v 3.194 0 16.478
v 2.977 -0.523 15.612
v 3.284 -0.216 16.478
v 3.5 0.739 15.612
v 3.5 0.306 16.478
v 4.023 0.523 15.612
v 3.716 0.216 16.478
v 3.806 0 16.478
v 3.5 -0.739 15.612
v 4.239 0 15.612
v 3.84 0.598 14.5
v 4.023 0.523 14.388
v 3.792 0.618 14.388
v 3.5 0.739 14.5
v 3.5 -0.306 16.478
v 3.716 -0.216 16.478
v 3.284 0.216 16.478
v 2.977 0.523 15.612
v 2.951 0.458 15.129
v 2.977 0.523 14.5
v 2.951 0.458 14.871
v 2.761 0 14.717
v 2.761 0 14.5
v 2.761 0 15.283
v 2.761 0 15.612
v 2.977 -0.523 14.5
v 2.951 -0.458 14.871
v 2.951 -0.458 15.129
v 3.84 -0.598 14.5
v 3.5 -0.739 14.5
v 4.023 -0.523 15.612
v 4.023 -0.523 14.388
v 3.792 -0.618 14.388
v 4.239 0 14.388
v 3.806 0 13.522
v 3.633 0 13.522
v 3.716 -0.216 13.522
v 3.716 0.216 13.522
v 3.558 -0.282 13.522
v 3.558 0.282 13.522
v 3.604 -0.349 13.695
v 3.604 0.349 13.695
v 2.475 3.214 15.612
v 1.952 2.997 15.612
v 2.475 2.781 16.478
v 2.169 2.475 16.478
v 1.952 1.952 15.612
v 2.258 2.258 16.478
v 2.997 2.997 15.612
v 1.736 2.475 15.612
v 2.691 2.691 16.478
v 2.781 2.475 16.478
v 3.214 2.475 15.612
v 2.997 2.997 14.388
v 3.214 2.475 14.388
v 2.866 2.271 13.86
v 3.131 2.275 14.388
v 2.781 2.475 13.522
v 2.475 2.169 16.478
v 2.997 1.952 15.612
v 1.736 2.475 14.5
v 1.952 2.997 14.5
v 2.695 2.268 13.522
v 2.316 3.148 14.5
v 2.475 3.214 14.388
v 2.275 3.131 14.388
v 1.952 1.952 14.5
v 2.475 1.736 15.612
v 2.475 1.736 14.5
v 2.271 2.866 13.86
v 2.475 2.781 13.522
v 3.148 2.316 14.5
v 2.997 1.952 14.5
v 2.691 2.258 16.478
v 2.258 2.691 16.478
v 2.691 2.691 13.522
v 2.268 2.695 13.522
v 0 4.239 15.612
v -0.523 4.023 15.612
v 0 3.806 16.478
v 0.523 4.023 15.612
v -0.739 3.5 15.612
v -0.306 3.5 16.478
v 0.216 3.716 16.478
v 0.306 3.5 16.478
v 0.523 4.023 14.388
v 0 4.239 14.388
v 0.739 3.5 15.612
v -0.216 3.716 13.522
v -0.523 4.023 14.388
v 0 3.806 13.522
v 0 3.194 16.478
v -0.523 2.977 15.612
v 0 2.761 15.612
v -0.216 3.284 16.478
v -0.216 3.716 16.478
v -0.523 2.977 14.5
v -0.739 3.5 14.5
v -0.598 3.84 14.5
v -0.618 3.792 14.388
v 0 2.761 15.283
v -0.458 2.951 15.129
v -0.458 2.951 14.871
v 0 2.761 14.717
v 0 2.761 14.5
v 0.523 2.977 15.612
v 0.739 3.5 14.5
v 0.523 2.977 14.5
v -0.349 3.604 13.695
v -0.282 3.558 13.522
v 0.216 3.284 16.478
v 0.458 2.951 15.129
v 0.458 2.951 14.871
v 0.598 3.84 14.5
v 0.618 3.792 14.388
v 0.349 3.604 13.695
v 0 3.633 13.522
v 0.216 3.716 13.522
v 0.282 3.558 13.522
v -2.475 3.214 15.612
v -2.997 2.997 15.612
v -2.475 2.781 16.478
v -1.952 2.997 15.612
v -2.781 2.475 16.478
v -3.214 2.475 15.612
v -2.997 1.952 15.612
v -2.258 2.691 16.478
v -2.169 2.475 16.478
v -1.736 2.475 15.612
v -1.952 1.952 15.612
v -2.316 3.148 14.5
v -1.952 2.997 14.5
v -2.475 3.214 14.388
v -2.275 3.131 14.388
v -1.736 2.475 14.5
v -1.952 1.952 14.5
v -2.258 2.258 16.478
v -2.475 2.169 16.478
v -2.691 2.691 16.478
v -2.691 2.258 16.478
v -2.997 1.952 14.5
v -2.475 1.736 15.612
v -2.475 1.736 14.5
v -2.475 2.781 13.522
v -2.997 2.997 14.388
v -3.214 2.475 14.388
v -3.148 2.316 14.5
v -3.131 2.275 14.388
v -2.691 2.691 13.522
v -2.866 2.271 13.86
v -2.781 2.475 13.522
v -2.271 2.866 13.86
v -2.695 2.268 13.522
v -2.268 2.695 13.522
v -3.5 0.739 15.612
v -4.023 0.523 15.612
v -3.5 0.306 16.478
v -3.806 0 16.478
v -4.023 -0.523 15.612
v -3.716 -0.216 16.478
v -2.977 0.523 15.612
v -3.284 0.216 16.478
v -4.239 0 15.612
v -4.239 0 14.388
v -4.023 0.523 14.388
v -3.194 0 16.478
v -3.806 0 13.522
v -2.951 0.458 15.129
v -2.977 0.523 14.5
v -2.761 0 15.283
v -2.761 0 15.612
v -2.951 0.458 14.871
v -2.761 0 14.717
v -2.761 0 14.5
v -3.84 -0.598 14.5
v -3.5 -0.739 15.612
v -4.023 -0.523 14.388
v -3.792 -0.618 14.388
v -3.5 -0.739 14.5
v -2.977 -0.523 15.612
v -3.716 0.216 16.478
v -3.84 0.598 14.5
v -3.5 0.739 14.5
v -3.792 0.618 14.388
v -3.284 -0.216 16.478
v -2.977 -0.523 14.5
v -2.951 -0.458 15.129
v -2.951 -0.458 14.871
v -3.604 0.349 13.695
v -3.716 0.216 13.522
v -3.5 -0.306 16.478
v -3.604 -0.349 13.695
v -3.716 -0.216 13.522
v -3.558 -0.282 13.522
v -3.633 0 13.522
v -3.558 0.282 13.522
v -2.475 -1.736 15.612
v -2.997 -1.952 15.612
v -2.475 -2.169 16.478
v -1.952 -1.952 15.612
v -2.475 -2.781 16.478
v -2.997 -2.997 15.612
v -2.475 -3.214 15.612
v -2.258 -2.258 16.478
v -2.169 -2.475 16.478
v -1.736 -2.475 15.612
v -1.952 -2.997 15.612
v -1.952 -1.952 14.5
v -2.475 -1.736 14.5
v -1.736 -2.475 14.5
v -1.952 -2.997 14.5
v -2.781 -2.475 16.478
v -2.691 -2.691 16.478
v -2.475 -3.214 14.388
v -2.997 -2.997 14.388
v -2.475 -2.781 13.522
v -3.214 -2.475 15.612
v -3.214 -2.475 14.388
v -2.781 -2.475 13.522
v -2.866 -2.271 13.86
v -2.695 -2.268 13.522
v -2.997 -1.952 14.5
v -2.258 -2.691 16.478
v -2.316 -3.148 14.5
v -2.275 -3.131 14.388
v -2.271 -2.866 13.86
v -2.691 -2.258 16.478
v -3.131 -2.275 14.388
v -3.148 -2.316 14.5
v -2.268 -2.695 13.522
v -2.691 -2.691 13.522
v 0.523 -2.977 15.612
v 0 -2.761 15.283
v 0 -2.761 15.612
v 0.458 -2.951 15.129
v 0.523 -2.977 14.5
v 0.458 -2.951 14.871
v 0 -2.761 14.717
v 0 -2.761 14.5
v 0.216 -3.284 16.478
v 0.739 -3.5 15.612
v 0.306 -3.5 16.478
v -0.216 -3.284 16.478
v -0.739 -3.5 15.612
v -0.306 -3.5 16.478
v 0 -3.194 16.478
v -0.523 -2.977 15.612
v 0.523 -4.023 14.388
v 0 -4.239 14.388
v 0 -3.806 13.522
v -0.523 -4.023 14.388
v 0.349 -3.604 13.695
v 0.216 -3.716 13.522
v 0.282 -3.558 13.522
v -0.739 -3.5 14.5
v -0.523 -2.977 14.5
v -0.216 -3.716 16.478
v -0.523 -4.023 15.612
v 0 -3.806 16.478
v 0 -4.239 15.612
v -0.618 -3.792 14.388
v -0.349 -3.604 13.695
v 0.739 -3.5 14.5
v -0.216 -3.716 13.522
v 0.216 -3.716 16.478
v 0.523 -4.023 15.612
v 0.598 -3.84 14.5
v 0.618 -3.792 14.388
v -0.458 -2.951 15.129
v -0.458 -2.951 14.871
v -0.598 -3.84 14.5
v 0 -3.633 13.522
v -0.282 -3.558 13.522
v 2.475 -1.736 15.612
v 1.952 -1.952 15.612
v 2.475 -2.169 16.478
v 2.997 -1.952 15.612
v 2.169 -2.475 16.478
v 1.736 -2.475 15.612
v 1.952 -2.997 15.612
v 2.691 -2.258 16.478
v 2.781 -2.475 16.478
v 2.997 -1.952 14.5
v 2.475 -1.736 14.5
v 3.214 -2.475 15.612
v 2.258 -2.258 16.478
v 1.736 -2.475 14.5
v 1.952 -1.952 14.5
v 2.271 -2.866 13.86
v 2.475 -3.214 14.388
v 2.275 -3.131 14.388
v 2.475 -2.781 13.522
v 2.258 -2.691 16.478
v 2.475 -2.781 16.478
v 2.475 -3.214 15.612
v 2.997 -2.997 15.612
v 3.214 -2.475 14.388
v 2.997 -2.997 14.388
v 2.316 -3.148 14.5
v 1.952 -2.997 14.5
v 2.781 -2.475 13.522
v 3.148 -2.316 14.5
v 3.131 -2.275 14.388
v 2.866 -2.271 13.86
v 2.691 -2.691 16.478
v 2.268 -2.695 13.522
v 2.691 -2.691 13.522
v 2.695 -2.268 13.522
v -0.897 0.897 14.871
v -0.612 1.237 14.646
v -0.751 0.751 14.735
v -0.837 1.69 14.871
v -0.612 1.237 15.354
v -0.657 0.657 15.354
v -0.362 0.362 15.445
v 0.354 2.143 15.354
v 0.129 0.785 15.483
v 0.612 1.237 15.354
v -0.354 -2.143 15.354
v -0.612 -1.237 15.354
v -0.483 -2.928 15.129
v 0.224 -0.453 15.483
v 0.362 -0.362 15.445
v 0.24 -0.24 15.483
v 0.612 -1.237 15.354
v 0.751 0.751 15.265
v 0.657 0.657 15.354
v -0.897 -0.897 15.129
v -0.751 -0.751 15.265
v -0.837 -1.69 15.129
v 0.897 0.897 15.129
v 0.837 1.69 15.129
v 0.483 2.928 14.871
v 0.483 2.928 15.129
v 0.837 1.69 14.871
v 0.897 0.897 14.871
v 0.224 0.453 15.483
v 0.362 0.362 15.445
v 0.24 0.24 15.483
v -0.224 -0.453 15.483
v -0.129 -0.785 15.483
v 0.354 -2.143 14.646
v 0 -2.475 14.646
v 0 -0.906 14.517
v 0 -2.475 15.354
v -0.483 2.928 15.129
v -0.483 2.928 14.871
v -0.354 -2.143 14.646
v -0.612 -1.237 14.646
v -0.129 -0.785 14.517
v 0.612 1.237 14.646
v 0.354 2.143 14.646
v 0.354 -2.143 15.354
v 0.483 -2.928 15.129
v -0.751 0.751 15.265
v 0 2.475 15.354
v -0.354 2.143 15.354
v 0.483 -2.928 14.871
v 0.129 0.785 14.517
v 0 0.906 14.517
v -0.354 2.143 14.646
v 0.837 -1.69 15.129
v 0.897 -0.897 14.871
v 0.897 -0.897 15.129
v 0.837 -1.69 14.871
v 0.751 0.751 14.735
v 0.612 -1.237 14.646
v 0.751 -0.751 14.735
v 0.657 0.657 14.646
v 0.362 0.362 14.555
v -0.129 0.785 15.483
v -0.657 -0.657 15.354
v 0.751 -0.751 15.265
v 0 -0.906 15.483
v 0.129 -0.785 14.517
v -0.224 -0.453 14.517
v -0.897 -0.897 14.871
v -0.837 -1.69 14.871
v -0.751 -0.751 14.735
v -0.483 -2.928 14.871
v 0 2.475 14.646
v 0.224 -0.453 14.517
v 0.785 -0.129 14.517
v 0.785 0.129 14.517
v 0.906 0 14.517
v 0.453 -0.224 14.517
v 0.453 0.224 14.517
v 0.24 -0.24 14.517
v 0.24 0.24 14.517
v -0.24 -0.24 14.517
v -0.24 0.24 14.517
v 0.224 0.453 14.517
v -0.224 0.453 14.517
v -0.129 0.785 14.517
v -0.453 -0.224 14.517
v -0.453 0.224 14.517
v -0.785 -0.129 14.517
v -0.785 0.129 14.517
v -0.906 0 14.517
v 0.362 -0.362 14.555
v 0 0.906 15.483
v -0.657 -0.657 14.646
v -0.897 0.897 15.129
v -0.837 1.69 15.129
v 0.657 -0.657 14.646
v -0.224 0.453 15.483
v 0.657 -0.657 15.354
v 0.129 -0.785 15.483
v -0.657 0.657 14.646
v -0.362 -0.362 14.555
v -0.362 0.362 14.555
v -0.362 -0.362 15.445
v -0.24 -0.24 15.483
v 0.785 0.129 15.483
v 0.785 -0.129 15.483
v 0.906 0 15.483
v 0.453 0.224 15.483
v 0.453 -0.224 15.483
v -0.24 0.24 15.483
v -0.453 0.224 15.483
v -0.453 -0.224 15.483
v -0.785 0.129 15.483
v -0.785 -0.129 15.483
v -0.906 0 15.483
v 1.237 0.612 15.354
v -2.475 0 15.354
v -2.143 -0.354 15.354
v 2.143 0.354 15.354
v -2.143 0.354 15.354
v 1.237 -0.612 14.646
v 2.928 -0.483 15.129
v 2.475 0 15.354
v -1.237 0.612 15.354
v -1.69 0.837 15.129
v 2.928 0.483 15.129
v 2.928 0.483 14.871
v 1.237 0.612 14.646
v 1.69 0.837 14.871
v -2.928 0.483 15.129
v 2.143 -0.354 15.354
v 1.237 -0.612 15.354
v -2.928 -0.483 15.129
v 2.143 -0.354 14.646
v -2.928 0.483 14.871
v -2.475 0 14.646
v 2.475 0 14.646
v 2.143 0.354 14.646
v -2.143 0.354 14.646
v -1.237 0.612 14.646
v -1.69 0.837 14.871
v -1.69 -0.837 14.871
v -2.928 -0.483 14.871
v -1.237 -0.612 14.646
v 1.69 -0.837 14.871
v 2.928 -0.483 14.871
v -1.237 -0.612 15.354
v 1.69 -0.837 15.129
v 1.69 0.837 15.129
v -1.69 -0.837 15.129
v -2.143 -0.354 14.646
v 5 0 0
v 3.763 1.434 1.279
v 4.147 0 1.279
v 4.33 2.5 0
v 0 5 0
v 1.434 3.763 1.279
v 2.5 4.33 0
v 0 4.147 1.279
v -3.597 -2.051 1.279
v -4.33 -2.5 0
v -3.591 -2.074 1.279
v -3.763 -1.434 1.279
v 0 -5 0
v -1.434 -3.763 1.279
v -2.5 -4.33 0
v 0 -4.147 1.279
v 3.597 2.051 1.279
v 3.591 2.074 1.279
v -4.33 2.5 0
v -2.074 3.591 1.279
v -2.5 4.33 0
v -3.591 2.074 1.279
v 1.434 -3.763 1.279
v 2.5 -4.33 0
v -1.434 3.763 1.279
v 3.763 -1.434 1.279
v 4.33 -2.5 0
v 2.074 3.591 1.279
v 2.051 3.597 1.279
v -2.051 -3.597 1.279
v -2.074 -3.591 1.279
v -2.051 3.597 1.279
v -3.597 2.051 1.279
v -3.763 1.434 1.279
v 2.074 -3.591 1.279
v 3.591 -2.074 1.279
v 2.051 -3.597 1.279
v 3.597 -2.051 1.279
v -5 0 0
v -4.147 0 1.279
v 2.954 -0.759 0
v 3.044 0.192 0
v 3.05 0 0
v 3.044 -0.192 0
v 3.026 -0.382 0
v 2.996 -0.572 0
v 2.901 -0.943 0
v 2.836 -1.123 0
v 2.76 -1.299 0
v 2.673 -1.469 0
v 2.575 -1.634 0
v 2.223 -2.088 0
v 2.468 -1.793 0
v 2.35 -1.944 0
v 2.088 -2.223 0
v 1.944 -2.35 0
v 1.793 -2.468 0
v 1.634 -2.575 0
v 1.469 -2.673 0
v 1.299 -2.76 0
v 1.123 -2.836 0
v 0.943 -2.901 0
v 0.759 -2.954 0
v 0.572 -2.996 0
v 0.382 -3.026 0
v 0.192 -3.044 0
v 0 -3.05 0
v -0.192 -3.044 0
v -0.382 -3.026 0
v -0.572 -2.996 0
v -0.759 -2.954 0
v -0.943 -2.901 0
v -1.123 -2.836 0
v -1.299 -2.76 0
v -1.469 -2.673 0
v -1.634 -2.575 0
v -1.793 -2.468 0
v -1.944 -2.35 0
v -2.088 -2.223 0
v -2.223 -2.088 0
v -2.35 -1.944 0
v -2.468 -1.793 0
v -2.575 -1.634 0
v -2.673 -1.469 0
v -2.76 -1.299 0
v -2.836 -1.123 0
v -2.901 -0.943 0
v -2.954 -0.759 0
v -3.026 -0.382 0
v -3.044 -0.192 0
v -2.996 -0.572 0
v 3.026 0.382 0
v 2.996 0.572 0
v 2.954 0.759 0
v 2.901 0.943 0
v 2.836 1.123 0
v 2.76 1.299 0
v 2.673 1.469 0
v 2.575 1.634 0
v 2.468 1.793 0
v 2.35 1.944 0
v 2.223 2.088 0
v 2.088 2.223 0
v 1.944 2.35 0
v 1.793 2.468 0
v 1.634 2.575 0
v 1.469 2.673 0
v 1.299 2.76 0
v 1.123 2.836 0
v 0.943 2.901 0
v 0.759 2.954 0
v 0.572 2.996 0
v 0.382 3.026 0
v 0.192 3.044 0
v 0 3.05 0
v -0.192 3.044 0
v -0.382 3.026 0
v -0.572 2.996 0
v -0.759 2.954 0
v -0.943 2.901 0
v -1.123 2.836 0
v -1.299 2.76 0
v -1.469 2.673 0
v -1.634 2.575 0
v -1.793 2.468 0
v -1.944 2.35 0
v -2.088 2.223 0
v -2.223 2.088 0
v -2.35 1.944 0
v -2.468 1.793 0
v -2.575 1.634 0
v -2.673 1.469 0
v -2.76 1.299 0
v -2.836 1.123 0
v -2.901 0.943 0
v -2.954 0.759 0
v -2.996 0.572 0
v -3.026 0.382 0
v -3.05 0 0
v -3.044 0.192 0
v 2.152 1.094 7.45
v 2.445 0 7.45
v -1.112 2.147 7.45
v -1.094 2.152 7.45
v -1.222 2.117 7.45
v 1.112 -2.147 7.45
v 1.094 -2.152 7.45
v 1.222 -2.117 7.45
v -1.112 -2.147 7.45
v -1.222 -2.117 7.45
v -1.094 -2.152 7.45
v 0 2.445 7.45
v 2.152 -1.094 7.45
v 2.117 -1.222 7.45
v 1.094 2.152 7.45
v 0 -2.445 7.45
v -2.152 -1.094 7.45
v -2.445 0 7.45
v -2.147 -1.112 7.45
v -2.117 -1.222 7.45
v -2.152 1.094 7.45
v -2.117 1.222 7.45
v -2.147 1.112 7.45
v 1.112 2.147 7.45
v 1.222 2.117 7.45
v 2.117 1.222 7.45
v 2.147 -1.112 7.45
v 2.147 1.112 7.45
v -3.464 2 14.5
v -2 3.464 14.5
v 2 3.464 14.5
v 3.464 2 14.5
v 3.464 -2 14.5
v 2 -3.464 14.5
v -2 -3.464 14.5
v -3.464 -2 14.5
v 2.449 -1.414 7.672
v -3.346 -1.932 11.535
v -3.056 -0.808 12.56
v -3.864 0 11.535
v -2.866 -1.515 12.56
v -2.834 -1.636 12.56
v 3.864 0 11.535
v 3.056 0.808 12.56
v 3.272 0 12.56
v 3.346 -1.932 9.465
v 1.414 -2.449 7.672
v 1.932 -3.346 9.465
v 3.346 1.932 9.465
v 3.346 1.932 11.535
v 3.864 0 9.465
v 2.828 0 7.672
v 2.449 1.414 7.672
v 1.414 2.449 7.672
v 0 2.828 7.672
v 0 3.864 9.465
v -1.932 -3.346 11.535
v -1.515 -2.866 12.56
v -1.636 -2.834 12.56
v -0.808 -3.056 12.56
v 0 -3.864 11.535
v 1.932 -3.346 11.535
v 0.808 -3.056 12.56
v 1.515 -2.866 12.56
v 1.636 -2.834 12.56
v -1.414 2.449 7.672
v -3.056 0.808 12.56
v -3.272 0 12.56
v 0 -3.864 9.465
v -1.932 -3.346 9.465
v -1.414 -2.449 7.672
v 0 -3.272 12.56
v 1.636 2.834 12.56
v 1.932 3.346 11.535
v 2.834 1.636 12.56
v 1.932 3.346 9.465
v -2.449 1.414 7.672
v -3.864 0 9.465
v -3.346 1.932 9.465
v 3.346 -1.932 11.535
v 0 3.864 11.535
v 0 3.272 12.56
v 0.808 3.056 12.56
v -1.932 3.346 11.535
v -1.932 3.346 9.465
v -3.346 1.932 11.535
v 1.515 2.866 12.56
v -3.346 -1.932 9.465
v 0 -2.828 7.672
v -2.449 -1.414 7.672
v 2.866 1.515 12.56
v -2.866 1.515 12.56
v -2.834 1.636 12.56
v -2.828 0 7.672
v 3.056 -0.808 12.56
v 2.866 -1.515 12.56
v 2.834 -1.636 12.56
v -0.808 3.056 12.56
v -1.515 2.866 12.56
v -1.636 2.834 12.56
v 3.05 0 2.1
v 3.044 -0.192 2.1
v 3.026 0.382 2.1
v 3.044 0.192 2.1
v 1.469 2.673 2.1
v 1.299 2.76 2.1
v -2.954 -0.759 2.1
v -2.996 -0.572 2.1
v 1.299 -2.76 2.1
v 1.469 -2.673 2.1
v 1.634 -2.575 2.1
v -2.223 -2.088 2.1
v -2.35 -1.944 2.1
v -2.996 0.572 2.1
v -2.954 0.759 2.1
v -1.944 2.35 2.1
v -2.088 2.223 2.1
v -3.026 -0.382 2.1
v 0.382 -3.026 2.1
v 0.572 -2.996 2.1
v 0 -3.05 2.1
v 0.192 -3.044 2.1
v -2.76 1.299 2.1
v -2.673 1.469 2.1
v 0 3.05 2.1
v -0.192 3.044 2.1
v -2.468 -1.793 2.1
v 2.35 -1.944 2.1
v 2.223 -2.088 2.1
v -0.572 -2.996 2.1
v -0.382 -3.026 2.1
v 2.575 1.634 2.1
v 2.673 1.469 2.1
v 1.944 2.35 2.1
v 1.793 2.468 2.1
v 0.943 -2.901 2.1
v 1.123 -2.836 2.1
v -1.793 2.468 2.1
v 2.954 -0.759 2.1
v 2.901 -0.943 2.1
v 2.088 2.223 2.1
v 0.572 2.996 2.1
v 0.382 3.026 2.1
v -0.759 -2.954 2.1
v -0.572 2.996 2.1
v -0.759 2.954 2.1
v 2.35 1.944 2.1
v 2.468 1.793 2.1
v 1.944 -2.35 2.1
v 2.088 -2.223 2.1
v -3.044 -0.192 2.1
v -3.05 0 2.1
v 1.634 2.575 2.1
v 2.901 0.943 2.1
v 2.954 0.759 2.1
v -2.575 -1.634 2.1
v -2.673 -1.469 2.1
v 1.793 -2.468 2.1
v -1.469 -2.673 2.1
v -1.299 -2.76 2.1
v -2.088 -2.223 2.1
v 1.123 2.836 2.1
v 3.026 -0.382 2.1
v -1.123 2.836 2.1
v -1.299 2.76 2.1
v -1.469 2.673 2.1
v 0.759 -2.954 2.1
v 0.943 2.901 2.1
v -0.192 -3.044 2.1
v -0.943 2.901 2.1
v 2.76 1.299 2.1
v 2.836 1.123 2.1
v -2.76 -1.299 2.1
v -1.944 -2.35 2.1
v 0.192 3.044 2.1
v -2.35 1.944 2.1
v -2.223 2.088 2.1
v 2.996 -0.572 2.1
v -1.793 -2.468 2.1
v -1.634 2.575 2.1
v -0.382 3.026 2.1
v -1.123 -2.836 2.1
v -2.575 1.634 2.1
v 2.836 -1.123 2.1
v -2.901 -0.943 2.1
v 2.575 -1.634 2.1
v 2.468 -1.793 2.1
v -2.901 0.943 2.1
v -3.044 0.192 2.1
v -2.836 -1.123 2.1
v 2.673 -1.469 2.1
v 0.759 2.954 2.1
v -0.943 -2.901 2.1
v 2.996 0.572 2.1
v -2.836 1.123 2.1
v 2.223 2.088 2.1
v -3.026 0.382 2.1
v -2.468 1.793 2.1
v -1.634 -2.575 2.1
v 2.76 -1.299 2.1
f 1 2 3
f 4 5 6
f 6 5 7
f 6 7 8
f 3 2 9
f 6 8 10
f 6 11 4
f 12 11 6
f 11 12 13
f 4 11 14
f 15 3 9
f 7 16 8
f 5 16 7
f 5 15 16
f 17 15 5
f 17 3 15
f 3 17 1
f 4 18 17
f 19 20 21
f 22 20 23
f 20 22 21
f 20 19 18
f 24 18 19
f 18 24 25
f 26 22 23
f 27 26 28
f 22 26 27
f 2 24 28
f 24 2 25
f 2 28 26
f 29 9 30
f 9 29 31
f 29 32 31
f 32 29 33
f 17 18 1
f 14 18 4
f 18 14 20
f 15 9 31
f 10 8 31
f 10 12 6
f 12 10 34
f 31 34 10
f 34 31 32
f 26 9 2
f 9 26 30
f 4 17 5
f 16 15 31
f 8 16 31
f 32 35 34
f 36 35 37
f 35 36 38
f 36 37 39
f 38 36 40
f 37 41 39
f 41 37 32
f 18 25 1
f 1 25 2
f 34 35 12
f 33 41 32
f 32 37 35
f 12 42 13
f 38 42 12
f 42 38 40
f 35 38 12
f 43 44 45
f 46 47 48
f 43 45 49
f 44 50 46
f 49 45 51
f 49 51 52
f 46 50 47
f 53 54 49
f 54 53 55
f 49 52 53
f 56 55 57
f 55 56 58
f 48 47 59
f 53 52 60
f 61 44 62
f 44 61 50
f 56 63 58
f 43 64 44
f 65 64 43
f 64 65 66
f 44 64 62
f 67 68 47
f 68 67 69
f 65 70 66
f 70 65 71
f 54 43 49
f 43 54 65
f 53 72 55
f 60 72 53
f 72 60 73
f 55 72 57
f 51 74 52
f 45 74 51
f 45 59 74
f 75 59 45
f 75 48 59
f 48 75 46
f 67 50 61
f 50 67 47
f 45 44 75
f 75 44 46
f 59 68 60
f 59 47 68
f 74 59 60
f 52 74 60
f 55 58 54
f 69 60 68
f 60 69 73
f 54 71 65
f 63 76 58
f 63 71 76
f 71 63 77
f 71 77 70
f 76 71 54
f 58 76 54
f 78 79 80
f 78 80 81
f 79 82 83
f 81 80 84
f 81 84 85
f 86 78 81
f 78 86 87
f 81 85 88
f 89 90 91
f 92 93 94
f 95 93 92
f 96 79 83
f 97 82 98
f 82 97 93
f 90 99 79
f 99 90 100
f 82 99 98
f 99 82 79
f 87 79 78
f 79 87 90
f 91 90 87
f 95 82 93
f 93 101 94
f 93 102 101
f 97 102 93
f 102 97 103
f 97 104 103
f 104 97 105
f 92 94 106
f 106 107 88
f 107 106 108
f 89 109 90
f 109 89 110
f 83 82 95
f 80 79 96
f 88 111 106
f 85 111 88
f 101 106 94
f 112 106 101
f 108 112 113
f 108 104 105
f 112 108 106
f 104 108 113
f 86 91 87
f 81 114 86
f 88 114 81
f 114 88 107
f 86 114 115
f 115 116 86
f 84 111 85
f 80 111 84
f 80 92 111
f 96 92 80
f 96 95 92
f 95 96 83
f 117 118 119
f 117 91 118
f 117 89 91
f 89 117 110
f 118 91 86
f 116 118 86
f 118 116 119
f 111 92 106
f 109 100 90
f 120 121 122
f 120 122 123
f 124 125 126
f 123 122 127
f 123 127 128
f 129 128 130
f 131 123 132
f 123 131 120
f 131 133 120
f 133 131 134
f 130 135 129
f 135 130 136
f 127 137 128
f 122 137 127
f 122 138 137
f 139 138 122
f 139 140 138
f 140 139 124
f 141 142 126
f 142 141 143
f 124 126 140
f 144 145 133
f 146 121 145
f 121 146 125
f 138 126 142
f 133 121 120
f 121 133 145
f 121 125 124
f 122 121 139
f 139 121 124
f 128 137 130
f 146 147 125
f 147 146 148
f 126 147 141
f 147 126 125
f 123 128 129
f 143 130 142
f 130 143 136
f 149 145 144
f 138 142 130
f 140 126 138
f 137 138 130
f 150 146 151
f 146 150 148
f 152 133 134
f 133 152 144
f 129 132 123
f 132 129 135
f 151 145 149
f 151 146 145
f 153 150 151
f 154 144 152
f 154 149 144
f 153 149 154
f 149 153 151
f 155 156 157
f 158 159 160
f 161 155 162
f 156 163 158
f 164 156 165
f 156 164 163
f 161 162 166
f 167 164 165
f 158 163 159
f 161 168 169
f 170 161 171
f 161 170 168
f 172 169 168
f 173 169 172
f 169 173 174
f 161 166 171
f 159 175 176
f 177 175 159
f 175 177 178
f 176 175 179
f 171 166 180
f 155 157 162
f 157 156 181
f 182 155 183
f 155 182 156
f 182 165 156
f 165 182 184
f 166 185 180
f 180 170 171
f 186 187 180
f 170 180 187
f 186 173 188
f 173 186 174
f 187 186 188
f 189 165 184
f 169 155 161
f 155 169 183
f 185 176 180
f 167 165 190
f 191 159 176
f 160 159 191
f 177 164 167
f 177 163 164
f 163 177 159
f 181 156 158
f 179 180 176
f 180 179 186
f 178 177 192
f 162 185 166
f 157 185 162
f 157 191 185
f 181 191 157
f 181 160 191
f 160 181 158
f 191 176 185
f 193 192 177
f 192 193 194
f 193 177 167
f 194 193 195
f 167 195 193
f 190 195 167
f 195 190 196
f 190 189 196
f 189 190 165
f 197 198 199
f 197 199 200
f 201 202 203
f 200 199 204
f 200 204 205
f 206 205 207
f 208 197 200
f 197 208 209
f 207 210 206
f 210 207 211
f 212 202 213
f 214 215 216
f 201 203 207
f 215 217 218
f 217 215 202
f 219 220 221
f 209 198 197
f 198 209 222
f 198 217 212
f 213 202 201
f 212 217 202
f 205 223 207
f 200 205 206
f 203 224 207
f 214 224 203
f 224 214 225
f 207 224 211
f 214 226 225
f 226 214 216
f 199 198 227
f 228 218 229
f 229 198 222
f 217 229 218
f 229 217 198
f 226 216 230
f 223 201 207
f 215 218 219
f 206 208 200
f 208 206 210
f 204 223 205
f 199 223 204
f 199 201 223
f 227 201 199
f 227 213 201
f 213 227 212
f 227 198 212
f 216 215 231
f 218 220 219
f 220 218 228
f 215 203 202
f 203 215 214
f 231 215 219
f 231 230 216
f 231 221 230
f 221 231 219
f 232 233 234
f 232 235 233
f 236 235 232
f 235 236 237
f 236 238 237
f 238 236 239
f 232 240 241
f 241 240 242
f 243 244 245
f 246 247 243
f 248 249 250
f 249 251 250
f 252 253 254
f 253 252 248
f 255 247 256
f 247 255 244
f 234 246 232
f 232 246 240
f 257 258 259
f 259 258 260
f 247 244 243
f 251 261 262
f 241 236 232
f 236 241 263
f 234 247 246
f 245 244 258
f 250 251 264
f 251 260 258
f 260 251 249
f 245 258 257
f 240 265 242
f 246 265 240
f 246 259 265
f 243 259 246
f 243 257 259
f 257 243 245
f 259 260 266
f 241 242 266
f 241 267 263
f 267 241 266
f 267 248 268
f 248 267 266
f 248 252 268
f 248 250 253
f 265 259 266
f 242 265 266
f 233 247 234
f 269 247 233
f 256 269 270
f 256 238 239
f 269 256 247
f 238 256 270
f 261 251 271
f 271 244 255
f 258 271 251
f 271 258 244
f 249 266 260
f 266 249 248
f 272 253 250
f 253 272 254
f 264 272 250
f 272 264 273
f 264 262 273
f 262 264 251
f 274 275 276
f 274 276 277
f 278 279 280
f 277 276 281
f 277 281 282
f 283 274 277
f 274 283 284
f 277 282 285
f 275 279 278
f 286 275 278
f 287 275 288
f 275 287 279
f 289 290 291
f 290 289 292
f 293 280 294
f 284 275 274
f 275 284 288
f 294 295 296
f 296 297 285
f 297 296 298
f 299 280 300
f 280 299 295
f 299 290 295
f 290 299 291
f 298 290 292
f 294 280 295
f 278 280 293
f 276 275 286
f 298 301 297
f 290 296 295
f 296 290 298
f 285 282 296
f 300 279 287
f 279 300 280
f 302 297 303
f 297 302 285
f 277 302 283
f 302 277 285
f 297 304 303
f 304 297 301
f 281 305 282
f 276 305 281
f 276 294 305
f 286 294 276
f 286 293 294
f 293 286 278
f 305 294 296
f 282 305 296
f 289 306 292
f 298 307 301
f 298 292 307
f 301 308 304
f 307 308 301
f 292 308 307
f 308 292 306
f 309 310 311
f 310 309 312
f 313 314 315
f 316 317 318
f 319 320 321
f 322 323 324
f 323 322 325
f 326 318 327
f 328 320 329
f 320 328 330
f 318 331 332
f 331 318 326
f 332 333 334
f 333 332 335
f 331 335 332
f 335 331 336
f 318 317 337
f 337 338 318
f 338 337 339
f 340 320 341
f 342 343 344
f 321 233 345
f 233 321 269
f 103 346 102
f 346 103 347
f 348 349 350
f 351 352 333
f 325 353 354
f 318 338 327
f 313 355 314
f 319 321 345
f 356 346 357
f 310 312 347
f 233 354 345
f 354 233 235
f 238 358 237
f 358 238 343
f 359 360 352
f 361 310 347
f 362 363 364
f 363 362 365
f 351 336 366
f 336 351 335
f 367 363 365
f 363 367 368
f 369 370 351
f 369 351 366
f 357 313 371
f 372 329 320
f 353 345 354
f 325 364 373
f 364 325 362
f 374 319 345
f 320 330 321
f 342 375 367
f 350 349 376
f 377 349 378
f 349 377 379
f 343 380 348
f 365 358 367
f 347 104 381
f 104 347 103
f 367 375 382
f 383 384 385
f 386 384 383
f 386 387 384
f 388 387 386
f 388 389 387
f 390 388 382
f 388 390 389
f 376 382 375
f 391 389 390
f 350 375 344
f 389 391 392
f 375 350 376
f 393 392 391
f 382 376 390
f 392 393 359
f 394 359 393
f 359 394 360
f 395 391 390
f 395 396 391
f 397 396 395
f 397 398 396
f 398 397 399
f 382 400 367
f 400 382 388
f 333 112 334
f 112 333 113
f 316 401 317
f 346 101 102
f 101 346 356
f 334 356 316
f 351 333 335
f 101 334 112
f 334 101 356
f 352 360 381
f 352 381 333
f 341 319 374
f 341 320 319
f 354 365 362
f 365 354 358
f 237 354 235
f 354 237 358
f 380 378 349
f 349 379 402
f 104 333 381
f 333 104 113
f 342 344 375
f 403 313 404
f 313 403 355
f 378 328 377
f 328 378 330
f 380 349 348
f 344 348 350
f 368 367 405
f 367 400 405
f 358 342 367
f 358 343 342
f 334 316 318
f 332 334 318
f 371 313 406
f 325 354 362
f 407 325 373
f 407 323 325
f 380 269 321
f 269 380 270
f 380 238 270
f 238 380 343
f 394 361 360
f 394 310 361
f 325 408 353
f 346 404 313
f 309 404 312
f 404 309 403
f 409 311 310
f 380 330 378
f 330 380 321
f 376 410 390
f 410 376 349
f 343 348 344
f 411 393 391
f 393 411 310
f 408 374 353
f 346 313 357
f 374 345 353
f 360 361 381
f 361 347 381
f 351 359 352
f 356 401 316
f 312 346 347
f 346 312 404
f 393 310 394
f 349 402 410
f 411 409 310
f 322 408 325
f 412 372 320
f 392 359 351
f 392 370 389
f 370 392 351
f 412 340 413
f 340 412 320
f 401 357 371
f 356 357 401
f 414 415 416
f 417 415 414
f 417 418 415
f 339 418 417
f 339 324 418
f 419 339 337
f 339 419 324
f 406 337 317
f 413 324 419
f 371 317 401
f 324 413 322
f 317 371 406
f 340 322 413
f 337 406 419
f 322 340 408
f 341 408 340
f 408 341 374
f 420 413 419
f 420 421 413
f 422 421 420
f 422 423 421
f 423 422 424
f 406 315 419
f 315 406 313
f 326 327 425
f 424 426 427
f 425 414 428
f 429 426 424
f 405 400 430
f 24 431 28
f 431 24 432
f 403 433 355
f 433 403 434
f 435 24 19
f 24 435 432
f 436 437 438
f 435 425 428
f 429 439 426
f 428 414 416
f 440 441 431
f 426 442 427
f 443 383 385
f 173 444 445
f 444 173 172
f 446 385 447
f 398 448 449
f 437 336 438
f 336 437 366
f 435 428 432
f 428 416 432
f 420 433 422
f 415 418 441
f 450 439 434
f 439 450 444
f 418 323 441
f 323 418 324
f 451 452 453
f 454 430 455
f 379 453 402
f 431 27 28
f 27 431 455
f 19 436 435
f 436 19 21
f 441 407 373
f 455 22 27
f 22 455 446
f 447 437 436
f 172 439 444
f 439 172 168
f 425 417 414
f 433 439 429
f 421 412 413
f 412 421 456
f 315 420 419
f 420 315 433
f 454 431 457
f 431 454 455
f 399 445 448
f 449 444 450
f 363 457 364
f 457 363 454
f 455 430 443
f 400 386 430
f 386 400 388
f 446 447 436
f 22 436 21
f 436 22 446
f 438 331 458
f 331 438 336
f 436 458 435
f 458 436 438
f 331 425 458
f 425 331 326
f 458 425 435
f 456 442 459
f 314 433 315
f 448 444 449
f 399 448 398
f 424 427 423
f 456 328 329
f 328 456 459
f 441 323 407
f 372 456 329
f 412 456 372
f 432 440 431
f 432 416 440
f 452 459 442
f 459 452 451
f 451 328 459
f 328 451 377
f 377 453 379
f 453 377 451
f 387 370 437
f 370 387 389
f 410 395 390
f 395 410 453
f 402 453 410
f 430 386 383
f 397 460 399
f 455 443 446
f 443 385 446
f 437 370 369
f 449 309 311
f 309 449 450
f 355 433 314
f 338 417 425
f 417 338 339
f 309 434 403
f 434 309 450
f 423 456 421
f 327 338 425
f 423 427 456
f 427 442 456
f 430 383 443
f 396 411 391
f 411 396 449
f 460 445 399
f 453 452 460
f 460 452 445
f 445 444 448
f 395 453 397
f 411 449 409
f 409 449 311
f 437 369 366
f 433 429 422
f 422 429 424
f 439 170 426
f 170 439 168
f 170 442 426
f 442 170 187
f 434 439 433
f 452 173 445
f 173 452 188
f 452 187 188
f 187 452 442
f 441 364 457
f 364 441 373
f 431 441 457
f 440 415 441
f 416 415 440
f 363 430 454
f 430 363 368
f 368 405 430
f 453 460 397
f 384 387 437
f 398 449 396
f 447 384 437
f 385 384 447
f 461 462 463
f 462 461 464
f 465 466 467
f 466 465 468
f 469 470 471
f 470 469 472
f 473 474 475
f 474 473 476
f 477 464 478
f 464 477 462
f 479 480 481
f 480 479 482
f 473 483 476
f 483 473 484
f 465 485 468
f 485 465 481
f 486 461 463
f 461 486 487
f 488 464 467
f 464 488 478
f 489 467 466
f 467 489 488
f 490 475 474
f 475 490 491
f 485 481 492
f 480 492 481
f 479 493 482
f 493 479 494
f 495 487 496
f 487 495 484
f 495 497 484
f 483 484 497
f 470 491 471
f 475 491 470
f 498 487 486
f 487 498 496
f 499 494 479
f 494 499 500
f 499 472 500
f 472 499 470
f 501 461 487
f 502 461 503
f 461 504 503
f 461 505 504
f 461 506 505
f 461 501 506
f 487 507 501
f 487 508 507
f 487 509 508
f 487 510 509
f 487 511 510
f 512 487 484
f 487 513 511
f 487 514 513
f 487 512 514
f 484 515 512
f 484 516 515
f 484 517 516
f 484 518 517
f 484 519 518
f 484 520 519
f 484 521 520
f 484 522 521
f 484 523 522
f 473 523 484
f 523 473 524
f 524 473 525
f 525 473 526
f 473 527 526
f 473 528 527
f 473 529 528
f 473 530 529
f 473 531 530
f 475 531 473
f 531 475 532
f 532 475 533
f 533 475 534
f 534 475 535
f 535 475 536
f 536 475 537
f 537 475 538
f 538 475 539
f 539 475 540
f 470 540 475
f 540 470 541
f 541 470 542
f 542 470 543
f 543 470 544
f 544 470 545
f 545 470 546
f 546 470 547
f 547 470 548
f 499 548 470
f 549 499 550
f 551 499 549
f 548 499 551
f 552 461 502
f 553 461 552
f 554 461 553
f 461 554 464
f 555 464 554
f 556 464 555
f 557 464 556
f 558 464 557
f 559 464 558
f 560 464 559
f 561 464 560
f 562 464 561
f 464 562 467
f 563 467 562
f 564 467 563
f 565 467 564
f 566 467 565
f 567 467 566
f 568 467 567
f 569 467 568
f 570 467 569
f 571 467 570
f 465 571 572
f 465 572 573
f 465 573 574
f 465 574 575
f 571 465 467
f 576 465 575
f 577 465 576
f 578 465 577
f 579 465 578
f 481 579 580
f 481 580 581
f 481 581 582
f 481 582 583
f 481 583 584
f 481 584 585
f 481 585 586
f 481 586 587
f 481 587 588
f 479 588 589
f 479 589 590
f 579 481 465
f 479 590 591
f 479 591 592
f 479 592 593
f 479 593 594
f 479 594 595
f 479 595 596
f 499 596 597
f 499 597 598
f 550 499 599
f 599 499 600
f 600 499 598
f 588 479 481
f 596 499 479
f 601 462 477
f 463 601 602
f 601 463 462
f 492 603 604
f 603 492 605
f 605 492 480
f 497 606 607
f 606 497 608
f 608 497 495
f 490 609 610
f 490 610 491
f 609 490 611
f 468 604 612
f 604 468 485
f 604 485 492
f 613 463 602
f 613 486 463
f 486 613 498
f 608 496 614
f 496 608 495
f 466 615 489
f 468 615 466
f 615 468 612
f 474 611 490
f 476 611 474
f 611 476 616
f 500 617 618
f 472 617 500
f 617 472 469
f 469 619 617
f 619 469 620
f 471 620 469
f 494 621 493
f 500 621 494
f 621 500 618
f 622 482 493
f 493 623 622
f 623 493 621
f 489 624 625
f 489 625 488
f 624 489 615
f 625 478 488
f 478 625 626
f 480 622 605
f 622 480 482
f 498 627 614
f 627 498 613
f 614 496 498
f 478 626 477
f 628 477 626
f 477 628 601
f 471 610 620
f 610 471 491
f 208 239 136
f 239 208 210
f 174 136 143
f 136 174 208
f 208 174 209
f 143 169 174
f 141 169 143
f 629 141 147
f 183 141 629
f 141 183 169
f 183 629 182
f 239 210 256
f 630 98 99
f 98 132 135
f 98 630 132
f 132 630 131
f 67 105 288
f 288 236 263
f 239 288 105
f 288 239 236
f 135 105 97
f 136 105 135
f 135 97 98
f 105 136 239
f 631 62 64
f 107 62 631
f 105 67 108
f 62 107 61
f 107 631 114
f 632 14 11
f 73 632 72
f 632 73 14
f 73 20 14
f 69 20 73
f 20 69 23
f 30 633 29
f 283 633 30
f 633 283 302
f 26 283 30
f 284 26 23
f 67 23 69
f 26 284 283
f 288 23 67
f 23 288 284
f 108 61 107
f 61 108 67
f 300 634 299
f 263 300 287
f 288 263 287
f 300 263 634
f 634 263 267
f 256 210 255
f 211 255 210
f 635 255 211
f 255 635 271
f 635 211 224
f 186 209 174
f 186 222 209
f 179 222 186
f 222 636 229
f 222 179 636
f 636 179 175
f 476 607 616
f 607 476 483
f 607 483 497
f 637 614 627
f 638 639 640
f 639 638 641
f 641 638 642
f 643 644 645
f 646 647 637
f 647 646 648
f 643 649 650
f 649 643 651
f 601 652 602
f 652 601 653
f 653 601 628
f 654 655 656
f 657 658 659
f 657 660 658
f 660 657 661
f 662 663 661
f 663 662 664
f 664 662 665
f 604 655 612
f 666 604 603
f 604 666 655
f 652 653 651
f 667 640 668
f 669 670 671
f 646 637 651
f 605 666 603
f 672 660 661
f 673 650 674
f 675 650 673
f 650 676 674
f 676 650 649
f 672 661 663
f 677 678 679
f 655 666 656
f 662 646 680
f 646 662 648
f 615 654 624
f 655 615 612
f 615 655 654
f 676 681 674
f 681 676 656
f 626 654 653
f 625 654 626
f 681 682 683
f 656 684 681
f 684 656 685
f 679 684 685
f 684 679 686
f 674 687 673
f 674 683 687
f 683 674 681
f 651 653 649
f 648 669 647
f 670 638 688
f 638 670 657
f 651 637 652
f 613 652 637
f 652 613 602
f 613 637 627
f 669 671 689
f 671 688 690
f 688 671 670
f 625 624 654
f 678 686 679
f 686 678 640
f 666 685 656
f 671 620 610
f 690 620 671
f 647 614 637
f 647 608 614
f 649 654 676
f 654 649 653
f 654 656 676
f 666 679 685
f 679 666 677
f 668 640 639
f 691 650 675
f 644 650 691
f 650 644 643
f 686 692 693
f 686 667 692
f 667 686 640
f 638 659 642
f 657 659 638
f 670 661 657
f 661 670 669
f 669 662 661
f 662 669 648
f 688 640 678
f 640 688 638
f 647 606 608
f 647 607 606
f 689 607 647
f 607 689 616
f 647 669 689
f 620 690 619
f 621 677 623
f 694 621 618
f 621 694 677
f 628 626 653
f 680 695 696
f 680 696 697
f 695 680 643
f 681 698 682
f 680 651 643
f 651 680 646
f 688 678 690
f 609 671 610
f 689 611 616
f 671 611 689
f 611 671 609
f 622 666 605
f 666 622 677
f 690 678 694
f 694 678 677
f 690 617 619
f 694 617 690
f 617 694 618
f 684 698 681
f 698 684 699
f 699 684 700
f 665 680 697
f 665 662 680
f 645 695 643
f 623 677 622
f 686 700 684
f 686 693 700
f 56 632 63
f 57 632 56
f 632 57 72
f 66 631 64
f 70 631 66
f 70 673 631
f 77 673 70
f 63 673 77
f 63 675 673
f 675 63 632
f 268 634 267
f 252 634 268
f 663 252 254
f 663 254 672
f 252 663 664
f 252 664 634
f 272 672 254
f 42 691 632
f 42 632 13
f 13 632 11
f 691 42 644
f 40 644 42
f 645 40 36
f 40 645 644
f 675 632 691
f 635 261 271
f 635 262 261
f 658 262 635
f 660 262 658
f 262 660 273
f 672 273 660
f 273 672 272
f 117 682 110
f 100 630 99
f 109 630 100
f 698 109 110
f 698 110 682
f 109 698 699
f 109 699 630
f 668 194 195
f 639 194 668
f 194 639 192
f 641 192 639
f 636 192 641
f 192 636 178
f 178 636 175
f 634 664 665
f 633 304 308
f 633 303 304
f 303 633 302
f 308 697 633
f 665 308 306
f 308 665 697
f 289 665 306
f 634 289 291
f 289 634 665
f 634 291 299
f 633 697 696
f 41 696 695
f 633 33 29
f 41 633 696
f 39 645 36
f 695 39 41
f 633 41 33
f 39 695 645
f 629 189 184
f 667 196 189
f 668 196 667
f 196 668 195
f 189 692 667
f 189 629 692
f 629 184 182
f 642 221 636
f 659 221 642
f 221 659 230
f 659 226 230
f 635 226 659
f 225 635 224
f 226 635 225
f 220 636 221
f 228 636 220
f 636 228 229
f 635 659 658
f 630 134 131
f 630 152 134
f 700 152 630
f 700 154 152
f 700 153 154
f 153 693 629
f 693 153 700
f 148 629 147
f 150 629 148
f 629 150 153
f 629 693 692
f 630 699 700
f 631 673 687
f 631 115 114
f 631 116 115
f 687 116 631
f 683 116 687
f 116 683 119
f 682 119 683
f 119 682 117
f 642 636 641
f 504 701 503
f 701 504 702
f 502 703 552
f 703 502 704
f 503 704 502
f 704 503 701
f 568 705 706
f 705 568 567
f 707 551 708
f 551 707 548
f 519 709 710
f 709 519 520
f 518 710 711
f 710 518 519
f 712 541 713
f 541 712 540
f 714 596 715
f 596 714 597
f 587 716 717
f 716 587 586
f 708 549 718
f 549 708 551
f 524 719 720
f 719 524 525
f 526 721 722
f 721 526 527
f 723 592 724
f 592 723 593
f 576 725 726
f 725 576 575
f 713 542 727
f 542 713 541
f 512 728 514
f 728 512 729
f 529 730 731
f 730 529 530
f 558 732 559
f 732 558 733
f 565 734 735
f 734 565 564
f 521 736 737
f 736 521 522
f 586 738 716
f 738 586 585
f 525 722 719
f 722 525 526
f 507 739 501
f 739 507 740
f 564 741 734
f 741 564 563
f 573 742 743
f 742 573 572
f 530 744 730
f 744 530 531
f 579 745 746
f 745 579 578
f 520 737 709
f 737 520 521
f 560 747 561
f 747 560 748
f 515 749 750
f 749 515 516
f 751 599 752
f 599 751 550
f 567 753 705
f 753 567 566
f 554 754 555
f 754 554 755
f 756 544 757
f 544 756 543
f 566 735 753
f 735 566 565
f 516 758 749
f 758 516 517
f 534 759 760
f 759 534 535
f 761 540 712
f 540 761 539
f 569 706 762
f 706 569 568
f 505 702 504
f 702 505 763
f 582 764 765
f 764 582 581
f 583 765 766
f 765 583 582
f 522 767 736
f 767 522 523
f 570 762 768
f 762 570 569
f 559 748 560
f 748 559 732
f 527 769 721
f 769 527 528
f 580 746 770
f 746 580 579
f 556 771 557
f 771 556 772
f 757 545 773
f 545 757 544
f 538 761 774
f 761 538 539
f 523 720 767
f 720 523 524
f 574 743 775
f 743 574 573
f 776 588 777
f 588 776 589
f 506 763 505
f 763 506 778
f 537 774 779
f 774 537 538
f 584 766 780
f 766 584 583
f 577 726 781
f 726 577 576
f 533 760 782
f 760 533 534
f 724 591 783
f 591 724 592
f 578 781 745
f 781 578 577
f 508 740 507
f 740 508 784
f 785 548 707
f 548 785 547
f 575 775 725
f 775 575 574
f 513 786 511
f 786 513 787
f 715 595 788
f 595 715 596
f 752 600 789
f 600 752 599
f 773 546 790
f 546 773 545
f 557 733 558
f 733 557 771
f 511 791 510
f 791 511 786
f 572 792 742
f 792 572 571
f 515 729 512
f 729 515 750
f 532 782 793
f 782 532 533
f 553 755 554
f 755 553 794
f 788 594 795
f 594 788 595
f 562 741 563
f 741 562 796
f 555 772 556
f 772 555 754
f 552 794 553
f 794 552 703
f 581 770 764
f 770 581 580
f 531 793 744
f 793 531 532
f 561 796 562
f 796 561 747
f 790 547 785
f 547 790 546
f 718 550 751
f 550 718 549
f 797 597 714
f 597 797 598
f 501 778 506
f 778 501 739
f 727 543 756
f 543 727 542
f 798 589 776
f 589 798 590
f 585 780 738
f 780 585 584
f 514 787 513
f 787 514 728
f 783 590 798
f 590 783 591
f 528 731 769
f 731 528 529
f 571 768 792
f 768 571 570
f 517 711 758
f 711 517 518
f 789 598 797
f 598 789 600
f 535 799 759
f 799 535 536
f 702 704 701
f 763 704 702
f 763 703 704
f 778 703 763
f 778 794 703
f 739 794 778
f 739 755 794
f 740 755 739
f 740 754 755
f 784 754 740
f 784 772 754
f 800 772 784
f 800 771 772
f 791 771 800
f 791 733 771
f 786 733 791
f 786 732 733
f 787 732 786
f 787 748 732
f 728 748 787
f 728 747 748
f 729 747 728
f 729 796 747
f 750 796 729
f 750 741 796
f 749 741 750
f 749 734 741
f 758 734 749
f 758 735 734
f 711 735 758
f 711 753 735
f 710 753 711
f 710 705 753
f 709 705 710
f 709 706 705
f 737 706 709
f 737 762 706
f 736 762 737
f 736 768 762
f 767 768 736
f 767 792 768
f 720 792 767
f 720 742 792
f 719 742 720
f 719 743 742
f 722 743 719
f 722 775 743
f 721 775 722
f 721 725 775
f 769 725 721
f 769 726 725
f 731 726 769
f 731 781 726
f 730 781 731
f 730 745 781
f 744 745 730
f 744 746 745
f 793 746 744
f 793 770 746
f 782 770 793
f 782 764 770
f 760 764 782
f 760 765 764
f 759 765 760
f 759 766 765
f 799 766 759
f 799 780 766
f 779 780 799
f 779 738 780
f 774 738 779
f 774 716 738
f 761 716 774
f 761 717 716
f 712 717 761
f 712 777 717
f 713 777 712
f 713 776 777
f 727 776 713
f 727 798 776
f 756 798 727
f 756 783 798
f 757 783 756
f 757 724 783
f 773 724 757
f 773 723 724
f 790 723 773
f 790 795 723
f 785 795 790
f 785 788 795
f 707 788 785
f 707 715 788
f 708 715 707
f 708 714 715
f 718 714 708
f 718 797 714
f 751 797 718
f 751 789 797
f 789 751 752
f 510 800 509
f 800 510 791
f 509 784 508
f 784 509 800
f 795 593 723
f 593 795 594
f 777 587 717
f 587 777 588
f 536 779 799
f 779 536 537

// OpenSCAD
/*
King Piece Generator
*/

// Parameters
$fn = 12; // Number of polygon sides (preview quality)

magnet_height = 2.1;       // Magnet height (mm)
magnet_radius = 3.05;      // Magnet radius (mm)

body_height = 14.5;        // Body height
body_radius = 4.5;         // Body radius

head_radius = 4;           // Head sphere radius

base_flare_radius = 5;     // Base flare (rim) radius
base_flare_height = 3;     // Base flare height

transparency = 5;          // Transparency level
color_rgb = [143, 255, 61]; // RGB color (0–255)

// Optional bounding box for max size
module bounds() {
    color("red", 0.3)
        cube([6, 1, 17]); // Max dimensions (W × D × H)
}

// Helper: Ring of spheres (used in crown decoration)
module ring_of_spheres(n = 12, radius = 3.5, sphere_radius = 0.8) {
    for (i = [0 : n - 1]) {
        angle = 360 / n * i;
        translate([radius * cos(angle), radius * sin(angle), 0])
            sphere(r = sphere_radius, $fn = 8);
    }
}

// Main model: King figure
module king() {
    union() {
        color(color_rgb / 255, transparency) {

            // Base flare (rim)
            cylinder(h = base_flare_height, r1 = base_flare_radius, r2 = base_flare_radius - 2, center = false);

            // Body (tapered cylinder)
            cylinder(h = body_height, r1 = body_radius, r2 = body_radius - 4, center = false);

            // Head (sphere)
            translate([0, 0, body_height - 4])
                sphere(r = head_radius);

            // Crown stem (cone)
            translate([0, 0, body_height - 4])
                cylinder(h = 8, r1 = 1, r2 = 4, center = true);

            // Crown decoration: scaled spheres & ring
            translate([0, 0, body_height + 0.5]) {

                // Two intersecting flattened spheres
                scale([1, 3.5, 0.5])
                    sphere(r = 1);

                scale([3.5, 1, 0.5])
                    sphere(r = 1);

                // Ring of small spheres
                scale([1, 1, 2])
                    ring_of_spheres(n = 8, radius = 3.5, sphere_radius = 0.8);
            }
        }
    }
}

// Magnet cavity
module magnet_cavity() {
    offset = 0.5;
    translate([0, 0, -offset]) {
        color("yellow", transparency)
            cylinder(h = magnet_height + offset, r = magnet_radius, center = false, $fn = 100);
    }
}

// Final model: king minus magnet hole
difference() {
    king();
    magnet_cavity();
}
